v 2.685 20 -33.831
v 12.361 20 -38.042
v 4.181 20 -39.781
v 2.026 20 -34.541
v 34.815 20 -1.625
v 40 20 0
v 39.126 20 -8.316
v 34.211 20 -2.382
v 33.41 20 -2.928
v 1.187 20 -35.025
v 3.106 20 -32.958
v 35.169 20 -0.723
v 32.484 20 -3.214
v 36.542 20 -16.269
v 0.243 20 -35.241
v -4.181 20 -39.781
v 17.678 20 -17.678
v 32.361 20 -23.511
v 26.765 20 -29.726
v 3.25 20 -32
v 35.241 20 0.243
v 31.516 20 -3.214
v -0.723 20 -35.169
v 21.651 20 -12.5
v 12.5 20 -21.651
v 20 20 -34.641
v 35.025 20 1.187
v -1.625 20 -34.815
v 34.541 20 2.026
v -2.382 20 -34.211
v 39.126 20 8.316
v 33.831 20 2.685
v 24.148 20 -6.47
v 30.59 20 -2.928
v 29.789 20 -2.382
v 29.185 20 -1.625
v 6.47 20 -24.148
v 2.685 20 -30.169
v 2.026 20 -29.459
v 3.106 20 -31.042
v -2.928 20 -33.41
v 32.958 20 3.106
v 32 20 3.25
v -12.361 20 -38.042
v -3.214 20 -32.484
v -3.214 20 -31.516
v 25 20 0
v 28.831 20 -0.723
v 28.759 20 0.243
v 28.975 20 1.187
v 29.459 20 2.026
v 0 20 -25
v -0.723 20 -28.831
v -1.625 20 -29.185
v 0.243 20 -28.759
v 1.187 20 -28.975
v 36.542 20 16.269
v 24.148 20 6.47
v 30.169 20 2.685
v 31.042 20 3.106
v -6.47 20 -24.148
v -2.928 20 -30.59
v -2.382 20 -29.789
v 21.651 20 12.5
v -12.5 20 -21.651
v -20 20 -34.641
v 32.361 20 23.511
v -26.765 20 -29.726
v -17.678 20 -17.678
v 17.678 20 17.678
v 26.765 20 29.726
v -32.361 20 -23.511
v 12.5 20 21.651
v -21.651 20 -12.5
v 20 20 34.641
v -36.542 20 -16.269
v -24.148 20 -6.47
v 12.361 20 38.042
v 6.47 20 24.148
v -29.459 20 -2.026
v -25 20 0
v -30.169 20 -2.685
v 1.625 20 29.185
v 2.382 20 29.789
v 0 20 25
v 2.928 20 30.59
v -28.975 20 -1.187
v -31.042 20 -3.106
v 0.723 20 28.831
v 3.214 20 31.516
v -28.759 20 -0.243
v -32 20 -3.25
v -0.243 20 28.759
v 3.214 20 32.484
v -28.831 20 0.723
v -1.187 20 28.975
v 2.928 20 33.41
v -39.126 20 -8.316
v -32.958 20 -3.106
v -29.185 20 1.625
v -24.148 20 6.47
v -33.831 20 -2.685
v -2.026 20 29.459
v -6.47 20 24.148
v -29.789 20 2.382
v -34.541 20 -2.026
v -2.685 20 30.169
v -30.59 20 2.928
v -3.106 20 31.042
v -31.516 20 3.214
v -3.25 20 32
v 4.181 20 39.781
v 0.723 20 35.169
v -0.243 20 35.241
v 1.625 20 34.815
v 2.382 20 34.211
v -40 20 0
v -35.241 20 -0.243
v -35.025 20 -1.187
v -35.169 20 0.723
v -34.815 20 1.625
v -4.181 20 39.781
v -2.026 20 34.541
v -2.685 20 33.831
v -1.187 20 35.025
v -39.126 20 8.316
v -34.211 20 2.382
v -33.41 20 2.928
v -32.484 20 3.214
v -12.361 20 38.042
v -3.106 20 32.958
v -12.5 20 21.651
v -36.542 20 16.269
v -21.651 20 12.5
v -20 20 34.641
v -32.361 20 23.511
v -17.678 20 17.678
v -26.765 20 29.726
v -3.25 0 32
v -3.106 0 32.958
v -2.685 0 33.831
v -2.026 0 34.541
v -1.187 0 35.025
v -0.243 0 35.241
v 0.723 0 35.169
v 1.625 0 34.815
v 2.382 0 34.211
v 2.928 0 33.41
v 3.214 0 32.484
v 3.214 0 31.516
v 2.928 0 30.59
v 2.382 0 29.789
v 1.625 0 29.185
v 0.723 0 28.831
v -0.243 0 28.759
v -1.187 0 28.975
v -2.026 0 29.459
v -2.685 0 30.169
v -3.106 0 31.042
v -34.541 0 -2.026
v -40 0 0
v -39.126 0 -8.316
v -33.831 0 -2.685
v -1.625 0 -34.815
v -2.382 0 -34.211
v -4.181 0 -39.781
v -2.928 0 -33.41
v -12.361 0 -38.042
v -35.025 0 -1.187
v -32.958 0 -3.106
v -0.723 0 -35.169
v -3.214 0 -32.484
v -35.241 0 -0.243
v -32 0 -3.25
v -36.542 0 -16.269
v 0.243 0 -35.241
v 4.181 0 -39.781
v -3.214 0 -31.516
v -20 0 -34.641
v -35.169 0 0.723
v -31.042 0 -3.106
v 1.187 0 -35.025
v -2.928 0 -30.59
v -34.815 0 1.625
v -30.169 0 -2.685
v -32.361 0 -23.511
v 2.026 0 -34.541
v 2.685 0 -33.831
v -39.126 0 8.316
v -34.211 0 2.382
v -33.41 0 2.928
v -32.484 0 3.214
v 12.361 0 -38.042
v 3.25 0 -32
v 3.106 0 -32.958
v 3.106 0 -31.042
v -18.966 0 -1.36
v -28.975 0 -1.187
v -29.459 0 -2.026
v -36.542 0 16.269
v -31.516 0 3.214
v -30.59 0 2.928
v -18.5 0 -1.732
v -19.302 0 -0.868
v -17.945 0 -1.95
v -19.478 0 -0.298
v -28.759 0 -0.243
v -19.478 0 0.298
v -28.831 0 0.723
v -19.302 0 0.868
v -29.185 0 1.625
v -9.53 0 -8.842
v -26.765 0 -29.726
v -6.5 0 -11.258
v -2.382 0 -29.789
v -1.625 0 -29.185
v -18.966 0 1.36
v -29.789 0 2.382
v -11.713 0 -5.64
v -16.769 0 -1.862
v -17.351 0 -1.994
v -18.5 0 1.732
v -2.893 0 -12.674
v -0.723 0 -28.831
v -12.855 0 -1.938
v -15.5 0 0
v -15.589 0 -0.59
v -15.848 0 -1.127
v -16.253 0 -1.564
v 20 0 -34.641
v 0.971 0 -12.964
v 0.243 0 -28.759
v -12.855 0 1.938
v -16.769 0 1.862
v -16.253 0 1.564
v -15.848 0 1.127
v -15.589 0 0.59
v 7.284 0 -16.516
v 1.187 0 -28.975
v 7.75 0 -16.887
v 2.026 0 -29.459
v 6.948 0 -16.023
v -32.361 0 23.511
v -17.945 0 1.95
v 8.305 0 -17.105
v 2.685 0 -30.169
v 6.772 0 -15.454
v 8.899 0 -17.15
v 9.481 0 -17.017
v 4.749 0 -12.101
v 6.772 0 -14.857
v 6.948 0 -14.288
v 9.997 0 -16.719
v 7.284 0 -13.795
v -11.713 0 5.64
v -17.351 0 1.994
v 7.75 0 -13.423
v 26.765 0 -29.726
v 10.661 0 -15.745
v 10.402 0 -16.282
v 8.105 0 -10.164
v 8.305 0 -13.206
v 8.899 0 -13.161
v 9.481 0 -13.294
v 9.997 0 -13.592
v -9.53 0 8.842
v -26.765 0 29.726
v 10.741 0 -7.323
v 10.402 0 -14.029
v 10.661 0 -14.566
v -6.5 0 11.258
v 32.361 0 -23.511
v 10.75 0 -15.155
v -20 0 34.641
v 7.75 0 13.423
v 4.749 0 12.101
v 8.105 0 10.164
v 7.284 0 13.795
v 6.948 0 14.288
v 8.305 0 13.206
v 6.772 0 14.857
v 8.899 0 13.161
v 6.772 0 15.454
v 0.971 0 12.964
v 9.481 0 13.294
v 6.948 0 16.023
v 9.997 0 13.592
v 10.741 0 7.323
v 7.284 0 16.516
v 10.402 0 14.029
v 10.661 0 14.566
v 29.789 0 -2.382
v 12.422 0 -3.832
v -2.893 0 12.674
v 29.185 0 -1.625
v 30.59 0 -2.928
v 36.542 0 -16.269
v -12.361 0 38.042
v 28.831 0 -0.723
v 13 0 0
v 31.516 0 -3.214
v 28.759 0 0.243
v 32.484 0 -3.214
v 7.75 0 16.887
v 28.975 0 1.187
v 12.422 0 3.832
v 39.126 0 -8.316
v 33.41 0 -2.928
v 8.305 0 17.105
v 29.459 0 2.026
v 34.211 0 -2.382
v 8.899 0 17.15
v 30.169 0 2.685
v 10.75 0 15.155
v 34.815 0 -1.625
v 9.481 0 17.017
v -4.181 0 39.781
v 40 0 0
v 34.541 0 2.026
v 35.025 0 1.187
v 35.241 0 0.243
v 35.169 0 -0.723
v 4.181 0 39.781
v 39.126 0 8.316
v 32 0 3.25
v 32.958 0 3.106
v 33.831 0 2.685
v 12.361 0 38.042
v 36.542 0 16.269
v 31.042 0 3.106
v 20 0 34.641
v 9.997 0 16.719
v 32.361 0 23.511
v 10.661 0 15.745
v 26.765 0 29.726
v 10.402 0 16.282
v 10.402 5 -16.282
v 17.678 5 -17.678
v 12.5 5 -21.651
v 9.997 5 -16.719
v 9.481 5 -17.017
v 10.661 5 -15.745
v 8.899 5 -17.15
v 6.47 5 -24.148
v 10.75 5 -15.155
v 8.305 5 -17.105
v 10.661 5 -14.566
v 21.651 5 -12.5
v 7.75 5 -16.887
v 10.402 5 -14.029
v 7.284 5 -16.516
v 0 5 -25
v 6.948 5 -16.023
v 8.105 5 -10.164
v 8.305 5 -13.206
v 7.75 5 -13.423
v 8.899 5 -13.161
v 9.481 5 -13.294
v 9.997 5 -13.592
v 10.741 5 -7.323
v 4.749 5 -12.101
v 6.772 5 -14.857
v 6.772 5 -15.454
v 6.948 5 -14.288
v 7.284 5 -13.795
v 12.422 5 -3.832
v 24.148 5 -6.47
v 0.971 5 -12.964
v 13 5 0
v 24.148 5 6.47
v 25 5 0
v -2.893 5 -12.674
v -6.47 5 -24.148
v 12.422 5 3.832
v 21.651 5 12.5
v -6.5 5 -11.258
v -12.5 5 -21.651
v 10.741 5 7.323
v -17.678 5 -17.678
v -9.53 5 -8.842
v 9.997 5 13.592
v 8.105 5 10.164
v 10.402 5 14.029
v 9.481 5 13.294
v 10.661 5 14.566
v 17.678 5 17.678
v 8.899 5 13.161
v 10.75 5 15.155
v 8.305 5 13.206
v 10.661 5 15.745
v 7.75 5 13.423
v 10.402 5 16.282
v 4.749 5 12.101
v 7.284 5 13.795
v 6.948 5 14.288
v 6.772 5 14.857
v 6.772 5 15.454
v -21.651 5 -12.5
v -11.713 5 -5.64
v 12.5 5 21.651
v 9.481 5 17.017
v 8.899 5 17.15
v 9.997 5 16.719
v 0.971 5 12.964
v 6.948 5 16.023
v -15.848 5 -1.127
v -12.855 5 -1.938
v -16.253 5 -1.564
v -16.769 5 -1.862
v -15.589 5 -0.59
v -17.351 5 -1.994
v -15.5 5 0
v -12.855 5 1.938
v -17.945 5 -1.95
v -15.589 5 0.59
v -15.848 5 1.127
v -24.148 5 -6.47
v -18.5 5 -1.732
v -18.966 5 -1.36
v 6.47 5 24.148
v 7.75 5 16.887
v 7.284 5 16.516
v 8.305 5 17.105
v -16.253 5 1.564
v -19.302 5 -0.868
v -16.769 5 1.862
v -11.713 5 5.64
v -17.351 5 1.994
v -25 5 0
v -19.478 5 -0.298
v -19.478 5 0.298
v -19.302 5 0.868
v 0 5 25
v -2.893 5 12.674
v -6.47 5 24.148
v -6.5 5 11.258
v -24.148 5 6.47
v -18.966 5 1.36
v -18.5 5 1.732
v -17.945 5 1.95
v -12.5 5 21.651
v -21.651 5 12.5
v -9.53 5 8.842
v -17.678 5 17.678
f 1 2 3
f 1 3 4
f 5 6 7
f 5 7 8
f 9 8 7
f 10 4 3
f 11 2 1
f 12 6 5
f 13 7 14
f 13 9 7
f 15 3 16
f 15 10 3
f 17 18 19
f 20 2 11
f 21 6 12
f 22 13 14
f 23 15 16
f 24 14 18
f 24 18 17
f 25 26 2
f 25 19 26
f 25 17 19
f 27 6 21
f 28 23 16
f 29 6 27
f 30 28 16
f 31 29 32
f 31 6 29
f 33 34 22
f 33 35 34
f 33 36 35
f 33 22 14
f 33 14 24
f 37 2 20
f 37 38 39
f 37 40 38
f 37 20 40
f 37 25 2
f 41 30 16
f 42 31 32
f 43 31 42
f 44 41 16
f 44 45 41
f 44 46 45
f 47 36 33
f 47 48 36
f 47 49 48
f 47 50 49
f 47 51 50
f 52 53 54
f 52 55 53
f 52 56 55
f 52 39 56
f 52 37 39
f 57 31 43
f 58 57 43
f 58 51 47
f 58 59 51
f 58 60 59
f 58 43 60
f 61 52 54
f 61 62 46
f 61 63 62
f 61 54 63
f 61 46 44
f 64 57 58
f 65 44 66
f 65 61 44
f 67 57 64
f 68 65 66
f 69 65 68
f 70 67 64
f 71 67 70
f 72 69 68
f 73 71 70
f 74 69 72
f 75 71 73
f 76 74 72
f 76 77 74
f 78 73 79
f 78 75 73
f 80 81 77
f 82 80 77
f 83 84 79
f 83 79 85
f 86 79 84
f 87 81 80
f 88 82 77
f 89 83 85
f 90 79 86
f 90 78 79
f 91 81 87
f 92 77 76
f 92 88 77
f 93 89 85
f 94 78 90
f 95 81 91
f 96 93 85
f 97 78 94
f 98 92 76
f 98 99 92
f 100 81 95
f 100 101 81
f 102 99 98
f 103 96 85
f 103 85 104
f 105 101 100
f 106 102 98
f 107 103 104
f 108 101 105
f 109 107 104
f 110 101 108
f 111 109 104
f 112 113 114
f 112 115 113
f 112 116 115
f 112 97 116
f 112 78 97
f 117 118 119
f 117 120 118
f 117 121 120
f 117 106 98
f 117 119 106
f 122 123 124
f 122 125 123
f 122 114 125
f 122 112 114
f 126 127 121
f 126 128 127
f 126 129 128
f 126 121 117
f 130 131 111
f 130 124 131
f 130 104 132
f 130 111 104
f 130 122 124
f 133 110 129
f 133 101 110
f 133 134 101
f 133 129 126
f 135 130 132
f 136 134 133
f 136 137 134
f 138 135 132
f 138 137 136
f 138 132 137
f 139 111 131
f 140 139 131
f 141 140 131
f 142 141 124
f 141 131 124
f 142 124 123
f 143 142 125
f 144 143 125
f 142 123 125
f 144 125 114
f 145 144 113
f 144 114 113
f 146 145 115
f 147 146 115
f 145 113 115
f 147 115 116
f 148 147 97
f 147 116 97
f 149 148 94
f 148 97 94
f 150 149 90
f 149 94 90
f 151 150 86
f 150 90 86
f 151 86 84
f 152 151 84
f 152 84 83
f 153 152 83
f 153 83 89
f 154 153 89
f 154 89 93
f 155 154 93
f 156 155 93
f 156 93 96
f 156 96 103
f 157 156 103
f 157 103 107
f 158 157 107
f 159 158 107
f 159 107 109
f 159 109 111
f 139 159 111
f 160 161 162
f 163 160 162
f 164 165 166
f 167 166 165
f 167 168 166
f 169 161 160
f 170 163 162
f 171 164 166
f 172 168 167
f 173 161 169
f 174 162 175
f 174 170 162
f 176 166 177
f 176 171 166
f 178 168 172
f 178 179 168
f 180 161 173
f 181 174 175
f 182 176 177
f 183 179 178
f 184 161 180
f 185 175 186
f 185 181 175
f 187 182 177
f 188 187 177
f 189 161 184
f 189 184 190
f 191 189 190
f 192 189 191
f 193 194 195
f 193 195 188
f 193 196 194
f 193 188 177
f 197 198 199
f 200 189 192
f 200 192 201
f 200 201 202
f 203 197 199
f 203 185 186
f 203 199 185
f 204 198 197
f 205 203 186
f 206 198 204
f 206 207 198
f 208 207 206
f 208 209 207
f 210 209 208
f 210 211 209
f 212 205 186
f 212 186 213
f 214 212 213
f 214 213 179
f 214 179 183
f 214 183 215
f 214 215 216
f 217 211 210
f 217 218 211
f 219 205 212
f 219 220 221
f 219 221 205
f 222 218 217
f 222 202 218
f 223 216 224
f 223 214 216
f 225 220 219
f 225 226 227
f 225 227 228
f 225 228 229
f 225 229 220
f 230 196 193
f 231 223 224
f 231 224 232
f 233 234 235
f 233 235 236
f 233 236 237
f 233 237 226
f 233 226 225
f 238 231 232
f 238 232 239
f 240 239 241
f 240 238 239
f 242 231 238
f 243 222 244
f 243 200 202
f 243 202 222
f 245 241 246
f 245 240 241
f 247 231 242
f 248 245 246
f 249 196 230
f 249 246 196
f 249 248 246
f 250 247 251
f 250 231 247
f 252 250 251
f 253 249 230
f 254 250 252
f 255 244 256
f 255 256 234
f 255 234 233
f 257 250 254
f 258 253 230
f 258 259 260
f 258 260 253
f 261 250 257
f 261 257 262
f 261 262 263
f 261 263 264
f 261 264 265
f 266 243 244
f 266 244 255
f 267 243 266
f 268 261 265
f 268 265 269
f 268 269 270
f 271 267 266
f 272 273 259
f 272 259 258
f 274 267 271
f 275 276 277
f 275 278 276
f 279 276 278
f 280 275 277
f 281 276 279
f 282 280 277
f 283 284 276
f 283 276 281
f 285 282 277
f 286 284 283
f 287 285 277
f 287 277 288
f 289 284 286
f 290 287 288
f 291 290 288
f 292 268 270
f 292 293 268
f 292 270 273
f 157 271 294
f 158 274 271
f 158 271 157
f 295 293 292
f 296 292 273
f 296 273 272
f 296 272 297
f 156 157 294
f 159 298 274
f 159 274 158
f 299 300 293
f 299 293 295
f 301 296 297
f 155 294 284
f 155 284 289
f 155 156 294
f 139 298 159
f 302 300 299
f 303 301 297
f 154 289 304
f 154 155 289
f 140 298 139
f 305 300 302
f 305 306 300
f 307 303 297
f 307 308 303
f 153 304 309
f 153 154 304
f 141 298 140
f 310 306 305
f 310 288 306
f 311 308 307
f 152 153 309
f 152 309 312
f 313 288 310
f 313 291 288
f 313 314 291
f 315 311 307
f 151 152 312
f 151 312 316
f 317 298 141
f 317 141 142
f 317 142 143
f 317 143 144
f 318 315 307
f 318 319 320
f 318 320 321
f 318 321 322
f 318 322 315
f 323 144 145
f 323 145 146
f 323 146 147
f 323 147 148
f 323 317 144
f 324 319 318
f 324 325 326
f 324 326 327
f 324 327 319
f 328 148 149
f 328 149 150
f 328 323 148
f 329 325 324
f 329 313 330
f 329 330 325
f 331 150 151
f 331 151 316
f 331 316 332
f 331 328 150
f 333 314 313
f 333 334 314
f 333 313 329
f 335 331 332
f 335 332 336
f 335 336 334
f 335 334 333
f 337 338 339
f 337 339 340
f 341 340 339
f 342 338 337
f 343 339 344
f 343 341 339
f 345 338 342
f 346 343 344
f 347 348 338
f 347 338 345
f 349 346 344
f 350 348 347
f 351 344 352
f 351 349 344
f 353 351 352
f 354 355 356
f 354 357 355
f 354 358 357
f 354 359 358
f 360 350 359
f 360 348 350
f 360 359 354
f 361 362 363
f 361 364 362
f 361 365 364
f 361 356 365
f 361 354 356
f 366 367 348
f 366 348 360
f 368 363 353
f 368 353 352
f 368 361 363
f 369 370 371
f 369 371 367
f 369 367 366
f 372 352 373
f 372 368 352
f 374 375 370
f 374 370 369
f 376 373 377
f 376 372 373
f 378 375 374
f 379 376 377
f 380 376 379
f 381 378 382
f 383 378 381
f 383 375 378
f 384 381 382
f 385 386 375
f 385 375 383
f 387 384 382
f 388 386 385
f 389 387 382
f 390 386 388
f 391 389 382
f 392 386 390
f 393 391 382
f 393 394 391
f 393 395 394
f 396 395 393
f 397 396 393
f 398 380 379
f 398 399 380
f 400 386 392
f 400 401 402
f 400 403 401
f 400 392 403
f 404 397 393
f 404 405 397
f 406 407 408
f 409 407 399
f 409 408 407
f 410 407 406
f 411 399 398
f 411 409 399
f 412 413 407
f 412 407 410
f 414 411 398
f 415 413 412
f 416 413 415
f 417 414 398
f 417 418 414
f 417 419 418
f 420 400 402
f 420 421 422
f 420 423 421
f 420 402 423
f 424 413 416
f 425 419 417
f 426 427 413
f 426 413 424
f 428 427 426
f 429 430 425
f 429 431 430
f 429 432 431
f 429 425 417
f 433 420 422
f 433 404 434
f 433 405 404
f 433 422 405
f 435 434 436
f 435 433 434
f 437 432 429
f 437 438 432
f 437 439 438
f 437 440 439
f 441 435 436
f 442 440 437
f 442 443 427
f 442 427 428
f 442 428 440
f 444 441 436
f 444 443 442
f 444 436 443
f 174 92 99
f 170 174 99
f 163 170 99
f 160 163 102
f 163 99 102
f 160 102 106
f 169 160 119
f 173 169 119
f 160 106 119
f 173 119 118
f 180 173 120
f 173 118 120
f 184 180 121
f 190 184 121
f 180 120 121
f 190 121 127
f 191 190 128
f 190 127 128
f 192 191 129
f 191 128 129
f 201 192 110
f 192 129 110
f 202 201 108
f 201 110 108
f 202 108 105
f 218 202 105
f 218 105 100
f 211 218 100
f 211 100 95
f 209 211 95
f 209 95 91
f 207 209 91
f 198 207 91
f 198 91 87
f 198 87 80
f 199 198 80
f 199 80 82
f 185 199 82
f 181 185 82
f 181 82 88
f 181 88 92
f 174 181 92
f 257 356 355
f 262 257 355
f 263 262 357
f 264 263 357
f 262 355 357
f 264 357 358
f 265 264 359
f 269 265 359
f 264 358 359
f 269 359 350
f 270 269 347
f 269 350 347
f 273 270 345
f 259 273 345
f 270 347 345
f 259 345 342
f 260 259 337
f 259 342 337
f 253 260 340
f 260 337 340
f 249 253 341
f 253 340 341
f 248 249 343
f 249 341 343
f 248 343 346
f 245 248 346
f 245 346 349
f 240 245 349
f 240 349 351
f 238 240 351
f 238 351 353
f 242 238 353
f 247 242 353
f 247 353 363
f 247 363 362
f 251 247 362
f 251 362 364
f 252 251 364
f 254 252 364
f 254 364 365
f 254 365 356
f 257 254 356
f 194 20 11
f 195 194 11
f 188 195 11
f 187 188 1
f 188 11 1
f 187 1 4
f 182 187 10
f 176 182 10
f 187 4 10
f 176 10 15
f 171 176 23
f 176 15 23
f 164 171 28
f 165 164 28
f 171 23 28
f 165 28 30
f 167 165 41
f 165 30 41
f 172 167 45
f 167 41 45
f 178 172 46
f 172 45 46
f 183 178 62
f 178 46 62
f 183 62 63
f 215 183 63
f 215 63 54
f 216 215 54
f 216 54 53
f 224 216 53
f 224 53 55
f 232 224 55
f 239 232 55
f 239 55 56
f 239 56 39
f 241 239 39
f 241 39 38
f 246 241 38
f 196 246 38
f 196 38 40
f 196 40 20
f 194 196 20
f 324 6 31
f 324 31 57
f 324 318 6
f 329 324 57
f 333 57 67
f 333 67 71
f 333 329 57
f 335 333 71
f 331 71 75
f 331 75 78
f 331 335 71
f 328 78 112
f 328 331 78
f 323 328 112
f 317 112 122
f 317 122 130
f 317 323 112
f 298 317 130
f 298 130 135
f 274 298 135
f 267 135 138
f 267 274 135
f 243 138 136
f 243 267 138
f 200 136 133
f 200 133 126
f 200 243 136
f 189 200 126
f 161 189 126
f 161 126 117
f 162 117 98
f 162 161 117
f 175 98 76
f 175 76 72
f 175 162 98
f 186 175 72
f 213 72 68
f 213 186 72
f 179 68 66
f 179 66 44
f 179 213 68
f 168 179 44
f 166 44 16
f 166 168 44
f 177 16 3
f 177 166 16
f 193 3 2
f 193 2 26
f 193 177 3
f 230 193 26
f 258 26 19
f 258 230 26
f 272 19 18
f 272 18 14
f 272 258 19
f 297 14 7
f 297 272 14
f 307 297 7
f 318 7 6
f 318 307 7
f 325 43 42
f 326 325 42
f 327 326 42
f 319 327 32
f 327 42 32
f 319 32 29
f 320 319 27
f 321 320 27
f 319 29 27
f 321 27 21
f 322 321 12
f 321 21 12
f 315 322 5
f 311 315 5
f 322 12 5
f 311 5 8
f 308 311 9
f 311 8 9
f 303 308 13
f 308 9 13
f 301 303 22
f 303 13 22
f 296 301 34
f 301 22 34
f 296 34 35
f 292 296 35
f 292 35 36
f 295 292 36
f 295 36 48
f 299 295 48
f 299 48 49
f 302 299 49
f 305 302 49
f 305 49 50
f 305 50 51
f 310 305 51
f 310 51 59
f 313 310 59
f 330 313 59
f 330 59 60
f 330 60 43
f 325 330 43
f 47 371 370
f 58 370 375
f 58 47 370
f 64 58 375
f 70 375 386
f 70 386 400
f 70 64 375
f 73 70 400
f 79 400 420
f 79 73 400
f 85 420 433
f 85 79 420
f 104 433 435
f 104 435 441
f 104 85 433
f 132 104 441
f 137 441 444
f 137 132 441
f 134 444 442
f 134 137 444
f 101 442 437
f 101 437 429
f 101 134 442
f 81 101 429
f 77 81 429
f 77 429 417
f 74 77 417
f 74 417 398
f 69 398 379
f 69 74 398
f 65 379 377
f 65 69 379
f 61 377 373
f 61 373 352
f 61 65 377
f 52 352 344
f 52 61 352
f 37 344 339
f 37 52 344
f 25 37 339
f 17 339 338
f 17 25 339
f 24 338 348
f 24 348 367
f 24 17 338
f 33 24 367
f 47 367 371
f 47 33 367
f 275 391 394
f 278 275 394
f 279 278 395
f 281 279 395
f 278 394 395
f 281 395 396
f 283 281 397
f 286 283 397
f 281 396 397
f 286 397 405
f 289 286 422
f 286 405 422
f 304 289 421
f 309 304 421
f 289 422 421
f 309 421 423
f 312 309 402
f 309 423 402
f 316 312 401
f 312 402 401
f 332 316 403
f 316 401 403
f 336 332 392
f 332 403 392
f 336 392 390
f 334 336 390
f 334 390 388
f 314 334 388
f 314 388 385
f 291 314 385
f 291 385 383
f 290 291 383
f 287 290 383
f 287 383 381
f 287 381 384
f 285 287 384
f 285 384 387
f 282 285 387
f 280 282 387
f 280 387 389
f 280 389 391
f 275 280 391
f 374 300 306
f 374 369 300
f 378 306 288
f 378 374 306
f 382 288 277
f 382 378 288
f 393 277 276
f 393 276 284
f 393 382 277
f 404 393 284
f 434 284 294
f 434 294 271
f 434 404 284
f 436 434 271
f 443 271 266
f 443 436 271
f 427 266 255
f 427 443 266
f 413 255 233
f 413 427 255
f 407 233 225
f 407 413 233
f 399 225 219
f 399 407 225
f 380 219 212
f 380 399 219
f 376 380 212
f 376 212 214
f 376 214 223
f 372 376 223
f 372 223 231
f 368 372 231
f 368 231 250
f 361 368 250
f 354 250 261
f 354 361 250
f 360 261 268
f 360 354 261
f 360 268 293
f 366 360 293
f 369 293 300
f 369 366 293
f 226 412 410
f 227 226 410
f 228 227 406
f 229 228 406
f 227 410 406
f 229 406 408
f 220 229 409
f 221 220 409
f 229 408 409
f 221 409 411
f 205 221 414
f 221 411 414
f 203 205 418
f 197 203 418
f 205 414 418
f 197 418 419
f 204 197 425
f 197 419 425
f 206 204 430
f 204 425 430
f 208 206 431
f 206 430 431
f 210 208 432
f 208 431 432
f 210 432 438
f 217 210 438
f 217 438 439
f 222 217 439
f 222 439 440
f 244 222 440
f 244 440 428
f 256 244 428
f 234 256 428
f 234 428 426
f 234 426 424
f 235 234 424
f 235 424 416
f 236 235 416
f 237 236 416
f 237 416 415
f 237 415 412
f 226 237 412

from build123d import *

# Parameters (mm, degrees)
SKETCH2_R          = 2
CUT_EXTRUDE1_DEPTH = 21
SKETCH3_R          = 3.25
CUT_EXTRUDE2_DEPTH = 21
CIRPATTERN1_COUNT  = 4
CIRPATTERN2_COUNT  = 3


with BuildPart() as part:
    # Sketch1 → Revolve1 (revolve)
    with BuildSketch(Plane.XY):
        Polygon((13, 0), (13, 5), (25, 5), (25, 20), (40, 20), (40, 0), align=None)
    revolve(axis=Axis((0, 51.395093442, 0), (0, -1, 0)))

    # Sketch2 → Cut-Extrude1 (cut, through all)
    with BuildSketch(Plane(origin=(0, 20, 0), x_dir=(1, 0, 0), z_dir=(0, 1, 0))):
        with Locations((-17.5, 0)):
            Circle(SKETCH2_R)
    cut_extrude1 = extrude(amount=-CUT_EXTRUDE1_DEPTH, mode=Mode.SUBTRACT)

    # Sketch3 → Cut-Extrude2 (cut, through all)
    with BuildSketch(Plane(origin=(0, 20, 0), x_dir=(1, 0, 0), z_dir=(0, 1, 0))):
        with Locations((0, 32)):
            Circle(SKETCH3_R)
    cut_extrude2 = extrude(amount=-CUT_EXTRUDE2_DEPTH, mode=Mode.SUBTRACT)

    # CirPattern1: Cut-Extrude2 ×4 about axis
    cirpattern1_axis = Axis((0, 0, 0), (0, 1, 0))
    for i in range(1, CIRPATTERN1_COUNT):
        add(cut_extrude2.rotate(cirpattern1_axis, i * 360 / CIRPATTERN1_COUNT), mode=Mode.SUBTRACT)

    # CirPattern2: Cut-Extrude1 ×3 about axis
    cirpattern2_axis = Axis((0, 0, 0), (0, 1, 0))
    for i in range(1, CIRPATTERN2_COUNT):
        add(cut_extrude1.rotate(cirpattern2_axis, i * 360 / CIRPATTERN2_COUNT), mode=Mode.SUBTRACT)


solid = part.part
